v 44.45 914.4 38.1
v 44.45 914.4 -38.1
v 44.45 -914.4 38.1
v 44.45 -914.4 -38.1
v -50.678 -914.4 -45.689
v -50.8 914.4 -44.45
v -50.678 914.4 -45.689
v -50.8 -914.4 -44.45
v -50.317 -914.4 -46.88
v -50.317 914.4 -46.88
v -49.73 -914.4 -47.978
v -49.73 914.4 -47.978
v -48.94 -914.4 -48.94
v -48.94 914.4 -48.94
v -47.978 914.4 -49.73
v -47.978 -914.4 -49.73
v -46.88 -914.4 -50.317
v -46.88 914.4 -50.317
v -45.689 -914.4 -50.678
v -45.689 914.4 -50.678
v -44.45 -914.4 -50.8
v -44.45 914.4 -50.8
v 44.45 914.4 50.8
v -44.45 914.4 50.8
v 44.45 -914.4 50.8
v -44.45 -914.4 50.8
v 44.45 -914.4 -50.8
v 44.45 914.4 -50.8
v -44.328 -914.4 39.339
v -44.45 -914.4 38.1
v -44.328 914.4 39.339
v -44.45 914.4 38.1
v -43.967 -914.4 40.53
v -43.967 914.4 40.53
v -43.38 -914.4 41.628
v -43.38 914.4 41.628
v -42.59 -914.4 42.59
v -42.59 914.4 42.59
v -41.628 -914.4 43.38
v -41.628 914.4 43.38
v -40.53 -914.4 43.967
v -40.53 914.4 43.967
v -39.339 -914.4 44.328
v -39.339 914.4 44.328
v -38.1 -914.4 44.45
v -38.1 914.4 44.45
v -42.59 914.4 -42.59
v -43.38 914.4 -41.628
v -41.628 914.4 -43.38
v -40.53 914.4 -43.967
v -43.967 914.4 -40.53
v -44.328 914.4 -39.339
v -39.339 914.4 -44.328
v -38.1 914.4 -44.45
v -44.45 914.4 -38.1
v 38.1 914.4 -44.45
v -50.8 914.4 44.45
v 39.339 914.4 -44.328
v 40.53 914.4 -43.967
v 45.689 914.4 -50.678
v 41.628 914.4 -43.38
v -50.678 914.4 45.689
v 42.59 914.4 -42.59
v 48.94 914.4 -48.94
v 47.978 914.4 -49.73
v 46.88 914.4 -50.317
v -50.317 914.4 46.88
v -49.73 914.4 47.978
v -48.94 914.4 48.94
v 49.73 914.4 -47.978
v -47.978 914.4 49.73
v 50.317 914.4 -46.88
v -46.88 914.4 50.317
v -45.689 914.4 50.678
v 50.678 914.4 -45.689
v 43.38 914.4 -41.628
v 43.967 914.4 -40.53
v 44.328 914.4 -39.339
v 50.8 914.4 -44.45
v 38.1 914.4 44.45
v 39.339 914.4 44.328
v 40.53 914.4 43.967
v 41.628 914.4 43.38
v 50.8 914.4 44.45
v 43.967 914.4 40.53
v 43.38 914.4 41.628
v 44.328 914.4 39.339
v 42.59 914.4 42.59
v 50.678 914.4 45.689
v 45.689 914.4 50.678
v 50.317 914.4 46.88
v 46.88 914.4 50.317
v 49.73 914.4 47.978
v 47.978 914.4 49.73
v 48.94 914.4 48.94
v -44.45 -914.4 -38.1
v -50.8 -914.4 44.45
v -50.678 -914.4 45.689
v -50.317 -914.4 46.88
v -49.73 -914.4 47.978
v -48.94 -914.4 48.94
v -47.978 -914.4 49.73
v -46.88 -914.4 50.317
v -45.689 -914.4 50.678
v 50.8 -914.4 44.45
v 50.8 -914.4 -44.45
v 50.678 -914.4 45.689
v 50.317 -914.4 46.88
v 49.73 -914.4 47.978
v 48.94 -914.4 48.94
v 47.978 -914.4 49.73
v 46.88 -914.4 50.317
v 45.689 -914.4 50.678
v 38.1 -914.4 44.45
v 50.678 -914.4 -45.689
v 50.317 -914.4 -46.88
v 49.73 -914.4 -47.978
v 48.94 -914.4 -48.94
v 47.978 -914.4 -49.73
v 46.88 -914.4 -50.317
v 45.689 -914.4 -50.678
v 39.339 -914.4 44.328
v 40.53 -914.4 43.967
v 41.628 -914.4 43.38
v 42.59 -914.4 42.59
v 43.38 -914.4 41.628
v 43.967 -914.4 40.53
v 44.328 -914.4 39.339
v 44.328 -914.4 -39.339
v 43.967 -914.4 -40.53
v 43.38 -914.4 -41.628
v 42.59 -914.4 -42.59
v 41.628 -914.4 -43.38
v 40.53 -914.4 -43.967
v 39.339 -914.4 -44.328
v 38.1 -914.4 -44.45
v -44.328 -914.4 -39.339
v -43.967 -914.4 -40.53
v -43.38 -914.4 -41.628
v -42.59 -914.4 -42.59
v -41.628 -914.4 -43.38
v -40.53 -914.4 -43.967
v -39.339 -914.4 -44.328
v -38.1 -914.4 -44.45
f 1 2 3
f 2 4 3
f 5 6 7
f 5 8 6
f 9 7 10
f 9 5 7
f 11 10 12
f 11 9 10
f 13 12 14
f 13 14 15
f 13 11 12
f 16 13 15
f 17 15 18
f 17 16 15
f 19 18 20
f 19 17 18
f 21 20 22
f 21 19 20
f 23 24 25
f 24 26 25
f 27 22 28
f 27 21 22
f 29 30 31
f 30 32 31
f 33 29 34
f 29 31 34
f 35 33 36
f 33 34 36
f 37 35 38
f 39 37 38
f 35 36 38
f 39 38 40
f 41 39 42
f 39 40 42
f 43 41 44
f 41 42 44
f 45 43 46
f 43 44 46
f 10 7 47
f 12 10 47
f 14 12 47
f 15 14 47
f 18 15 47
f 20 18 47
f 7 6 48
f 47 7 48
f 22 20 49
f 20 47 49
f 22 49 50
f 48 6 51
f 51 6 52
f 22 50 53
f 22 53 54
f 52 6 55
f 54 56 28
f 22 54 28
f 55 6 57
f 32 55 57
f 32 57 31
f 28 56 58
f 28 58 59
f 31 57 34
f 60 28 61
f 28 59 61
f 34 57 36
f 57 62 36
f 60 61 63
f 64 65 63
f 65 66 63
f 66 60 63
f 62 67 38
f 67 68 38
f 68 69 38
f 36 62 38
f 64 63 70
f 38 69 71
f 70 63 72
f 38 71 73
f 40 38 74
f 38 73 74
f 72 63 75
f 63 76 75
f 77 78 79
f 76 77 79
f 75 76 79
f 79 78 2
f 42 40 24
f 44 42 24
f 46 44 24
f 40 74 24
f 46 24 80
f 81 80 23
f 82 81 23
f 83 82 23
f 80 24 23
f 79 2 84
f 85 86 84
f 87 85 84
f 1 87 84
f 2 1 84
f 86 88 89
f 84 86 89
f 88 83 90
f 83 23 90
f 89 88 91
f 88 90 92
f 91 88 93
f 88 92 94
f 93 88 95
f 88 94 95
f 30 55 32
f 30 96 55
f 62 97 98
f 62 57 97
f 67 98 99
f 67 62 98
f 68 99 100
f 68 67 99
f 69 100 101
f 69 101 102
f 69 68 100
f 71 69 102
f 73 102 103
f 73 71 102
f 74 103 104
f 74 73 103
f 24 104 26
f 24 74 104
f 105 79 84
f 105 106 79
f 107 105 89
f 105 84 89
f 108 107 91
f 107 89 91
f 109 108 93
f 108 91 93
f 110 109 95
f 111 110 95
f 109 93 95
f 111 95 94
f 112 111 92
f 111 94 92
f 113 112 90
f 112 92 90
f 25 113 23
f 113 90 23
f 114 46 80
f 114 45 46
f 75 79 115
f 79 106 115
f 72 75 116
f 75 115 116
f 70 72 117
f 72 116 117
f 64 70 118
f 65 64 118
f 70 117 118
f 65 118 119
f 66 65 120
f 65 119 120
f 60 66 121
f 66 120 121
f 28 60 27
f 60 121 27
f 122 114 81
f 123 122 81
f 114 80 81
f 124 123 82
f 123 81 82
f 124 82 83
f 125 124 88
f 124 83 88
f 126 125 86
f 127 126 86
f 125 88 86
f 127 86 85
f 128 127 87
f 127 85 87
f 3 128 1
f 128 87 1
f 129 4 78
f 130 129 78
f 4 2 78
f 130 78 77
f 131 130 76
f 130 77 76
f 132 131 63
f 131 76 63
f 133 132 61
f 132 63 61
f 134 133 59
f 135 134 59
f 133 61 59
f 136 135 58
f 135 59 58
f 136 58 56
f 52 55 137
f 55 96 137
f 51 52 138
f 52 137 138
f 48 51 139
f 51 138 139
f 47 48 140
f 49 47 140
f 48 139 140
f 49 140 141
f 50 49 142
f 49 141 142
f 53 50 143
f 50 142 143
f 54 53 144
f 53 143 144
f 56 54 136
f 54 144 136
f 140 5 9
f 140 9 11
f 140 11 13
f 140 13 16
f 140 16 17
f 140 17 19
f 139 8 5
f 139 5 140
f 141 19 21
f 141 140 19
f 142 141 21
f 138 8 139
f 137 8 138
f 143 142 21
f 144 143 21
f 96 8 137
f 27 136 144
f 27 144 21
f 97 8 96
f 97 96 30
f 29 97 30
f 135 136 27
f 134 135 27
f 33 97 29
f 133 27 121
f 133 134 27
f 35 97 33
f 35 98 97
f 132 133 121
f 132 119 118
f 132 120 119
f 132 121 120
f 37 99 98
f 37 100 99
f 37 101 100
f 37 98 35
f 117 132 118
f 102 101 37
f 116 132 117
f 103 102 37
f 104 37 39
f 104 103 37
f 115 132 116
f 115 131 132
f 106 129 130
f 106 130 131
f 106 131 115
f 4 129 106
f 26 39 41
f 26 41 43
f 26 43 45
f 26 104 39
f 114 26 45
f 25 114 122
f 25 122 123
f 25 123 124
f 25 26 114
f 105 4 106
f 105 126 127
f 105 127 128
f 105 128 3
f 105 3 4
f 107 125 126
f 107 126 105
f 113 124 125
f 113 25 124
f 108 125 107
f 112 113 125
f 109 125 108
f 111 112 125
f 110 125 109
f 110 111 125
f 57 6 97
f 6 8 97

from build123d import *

# Parameters (mm, degrees)
F0_W     = 101.6
F0_H     = 101.6
F0_W_2   = 88.9
F0_H_2   = 88.9
F1_DEPTH = 914.4
F2_R     = 6.35


with BuildPart() as f1:
    # F0 (on Front) → F1 (new body, symmetric)
    with BuildSketch(Plane.XZ):
        Rectangle(F0_W, F0_H)
        Rectangle(F0_W_2, F0_H_2, mode=Mode.SUBTRACT)
    extrude(amount=F1_DEPTH, both=True)

    # F2
    f2_edges = [f1.edges().sort_by_distance(p)[0] for p in [
        (-50.8, 0, 50.8),
        (50.8, 0, 50.8),
        (44.45, 0, -44.45),
        (-44.45, 0, -44.45),
        (44.45, 0, 44.45),
        (-44.45, 0, 44.45),
        (50.8, 0, -50.8),
        (-50.8, 0, -50.8),
    ]]
    fillet(f2_edges, radius=F2_R)


solid = f1.part
